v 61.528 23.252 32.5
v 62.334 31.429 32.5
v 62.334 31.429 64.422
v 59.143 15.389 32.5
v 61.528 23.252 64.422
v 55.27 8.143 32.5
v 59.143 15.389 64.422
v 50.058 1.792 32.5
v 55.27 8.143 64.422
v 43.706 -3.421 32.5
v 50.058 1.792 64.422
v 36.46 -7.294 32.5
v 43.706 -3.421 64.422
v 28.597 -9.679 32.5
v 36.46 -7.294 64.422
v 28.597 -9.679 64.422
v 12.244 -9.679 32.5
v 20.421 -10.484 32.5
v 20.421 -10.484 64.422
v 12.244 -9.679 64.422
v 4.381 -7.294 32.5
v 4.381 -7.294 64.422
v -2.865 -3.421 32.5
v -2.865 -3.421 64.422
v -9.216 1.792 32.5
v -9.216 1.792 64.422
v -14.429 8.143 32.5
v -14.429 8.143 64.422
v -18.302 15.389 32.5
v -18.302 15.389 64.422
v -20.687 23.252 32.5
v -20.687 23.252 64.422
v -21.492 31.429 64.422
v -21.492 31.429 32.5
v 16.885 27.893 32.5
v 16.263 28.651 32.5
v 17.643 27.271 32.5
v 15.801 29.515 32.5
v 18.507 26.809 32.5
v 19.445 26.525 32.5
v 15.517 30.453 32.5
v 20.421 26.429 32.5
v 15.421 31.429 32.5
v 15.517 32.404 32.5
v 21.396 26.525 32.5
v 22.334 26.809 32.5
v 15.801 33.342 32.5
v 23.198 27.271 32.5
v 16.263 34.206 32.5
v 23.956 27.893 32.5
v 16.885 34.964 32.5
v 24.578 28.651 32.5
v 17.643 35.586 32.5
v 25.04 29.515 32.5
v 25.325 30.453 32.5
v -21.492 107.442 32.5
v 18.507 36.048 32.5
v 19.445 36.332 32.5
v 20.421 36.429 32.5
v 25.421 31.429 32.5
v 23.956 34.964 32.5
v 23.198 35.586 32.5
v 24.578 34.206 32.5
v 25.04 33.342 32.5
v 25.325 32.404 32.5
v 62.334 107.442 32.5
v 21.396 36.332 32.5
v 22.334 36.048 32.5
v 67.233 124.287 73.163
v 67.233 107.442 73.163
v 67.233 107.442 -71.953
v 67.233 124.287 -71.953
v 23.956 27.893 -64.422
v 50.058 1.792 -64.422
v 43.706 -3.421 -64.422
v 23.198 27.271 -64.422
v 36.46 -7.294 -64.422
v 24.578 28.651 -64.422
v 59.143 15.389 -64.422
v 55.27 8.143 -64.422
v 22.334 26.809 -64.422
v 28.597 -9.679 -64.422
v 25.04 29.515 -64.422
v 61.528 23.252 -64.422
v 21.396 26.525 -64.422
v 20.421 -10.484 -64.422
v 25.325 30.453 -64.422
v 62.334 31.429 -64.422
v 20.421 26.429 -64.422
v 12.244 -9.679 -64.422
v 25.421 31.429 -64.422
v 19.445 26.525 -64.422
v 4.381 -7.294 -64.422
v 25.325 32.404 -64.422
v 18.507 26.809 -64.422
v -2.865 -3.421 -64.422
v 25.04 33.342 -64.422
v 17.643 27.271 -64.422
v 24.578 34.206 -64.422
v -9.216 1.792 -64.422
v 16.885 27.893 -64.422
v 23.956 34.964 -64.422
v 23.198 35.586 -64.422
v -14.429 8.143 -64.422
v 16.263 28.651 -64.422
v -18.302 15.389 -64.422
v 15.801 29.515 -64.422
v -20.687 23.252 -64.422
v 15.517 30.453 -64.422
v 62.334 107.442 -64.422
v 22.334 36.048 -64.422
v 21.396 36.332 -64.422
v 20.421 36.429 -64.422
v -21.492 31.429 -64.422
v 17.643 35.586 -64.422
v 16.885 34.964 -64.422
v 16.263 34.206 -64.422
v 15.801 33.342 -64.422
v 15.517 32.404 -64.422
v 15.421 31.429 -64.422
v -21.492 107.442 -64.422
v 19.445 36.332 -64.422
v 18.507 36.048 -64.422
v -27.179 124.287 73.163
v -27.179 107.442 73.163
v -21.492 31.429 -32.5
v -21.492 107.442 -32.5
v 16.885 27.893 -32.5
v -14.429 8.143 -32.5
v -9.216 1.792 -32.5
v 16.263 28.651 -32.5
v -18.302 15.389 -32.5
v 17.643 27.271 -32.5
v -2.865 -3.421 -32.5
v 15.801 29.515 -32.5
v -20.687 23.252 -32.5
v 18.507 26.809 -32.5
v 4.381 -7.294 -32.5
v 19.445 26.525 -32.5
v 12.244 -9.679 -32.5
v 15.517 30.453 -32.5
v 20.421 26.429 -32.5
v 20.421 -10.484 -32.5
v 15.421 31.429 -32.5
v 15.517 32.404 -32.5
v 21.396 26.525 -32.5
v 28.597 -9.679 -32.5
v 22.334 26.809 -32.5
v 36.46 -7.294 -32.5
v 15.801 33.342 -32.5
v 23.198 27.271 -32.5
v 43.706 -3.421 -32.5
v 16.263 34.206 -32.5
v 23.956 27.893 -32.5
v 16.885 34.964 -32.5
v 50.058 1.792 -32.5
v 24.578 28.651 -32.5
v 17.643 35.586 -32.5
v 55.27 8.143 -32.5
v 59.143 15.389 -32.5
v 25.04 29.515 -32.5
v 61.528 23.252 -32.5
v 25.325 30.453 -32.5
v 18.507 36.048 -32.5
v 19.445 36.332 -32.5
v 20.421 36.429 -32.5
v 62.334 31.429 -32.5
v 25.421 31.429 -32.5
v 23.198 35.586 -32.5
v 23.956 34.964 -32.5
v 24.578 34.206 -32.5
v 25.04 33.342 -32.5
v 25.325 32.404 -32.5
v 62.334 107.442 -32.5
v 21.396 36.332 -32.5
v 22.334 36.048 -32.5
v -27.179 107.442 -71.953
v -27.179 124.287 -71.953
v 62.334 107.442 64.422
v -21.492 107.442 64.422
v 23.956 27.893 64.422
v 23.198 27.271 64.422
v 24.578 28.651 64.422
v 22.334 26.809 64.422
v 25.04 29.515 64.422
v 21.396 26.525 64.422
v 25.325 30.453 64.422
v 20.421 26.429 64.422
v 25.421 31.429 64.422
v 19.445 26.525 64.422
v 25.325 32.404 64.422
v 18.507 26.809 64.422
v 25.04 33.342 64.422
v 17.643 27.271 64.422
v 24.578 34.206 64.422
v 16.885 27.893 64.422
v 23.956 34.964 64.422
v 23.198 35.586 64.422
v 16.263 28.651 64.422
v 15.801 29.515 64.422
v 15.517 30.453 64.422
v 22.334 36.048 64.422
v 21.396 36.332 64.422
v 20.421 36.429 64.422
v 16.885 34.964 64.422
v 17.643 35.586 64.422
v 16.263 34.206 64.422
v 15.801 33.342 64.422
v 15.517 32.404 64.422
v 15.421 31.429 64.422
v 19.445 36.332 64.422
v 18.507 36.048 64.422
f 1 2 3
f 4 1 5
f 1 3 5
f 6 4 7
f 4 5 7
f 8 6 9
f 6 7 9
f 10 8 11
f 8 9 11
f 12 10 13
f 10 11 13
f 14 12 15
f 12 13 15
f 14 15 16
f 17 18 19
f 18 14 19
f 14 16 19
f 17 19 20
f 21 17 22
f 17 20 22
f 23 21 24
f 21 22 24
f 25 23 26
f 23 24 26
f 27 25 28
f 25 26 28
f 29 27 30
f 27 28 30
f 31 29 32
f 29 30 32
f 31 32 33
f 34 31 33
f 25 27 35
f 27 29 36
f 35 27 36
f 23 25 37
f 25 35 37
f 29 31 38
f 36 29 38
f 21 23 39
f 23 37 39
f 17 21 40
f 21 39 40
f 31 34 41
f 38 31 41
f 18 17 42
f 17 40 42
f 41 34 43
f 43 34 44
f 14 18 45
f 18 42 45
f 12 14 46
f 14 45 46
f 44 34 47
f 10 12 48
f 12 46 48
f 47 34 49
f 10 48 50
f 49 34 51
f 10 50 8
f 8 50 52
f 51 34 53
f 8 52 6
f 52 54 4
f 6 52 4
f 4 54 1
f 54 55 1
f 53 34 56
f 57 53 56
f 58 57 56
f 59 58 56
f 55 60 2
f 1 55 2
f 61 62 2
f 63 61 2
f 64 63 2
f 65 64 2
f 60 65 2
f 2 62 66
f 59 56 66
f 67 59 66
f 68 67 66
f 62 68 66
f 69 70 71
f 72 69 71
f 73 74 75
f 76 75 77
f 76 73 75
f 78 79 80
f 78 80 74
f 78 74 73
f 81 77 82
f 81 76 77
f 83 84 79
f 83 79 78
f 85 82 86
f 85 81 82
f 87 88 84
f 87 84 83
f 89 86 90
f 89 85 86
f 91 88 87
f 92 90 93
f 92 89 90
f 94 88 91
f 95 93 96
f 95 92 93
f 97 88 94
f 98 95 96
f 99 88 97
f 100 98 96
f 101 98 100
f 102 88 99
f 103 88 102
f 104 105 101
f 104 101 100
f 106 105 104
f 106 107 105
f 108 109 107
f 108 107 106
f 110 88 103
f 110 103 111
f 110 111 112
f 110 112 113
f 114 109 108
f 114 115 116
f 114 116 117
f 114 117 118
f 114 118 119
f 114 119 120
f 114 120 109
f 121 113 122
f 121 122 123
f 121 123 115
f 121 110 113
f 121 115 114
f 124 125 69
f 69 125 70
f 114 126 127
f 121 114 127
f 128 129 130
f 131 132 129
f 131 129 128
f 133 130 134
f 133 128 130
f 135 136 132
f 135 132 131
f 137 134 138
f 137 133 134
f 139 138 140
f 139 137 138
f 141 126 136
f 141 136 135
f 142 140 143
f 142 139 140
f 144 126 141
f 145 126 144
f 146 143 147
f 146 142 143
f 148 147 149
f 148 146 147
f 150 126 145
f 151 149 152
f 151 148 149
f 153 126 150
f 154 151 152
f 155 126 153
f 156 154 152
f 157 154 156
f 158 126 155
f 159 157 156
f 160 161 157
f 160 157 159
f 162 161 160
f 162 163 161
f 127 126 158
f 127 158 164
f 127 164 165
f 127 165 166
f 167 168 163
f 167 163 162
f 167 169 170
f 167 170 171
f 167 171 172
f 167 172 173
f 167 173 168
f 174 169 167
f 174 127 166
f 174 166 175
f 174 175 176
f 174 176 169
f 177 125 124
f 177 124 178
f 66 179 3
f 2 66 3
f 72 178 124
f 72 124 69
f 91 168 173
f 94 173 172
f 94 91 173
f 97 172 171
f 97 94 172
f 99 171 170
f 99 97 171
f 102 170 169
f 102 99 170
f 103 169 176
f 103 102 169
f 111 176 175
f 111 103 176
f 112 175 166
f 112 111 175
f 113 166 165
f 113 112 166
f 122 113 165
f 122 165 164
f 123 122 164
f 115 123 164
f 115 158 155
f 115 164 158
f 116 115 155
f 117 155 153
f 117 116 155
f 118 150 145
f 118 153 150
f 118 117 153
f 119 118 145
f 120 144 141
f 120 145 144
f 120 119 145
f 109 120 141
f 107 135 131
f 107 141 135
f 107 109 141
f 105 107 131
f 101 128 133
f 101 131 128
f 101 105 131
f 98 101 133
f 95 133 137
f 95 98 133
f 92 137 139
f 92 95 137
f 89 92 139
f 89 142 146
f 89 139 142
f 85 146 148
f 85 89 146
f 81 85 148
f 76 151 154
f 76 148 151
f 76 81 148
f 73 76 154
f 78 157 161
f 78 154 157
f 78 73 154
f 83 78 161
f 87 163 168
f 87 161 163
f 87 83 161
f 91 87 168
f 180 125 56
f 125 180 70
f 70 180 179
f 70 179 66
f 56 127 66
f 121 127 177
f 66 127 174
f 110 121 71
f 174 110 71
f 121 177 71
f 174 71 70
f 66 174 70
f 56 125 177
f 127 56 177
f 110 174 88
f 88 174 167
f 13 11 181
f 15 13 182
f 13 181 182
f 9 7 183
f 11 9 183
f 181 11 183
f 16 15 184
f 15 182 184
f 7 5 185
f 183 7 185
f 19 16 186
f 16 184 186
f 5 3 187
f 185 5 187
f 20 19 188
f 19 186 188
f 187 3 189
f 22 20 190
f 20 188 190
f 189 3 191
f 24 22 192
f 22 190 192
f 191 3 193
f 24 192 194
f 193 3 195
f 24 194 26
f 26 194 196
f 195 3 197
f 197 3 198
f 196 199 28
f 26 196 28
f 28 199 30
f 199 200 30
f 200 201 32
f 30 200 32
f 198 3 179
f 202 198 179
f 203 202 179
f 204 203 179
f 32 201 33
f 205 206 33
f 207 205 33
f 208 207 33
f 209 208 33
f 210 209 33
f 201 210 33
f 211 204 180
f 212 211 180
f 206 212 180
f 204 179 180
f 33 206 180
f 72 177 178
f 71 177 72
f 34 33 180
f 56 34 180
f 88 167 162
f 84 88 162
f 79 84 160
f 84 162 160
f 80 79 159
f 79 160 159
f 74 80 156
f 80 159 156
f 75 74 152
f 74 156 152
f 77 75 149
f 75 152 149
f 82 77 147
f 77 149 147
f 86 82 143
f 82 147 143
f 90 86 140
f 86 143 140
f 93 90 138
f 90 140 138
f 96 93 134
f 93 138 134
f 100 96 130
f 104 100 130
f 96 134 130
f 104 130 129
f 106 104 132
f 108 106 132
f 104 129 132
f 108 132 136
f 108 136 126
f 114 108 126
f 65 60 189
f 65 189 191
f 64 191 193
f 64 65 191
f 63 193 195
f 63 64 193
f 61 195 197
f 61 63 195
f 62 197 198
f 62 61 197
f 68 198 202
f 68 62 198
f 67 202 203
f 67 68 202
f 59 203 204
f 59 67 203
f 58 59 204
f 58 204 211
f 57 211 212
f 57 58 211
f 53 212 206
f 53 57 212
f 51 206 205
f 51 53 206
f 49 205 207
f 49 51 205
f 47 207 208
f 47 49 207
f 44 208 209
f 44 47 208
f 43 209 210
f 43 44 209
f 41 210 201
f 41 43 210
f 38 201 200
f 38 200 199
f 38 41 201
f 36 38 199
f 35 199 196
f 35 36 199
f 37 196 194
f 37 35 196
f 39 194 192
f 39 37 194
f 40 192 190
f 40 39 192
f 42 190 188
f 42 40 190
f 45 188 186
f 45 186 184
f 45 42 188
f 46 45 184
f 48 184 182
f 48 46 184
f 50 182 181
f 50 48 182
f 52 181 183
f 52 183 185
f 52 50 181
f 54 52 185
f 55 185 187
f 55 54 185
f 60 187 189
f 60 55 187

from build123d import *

# Parameters (mm, degrees)
SKETCH4_R           = 5
BOSS_EXTRUDE4_DEPTH = 64.422352731
SKETCH6_W           = 94.412285725
SKETCH6_H           = 145.116249754
BOSS_EXTRUDE5_DEPTH = 16.844705461
SKETCH7_W           = 105.313643584
SKETCH7_H           = 127.479897163
CUT_EXTRUDE1_DEPTH  = 32.5


with BuildPart() as part:
    # Sketch4 → Boss-Extrude4 (new body, symmetric)
    with BuildSketch(Plane.XY):
        with BuildLine():
            Line((-21.492390891, 31.428545296), (-21.492390891, 107.442049888))
            Line((-21.492390891, 107.442049888), (62.333666954, 107.442049888))
            Line((62.333666954, 107.442049888), (62.333666954, 31.428545296))
            ThreePointArc((62.333666954, 31.428545296), (20.420638031, -10.484483627), (-21.492390891, 31.428545296))
        make_face()
        with Locations((20.420638031, 31.428545296)):
            Circle(SKETCH4_R, mode=Mode.SUBTRACT)
    extrude(amount=BOSS_EXTRUDE4_DEPTH, both=True)

    # Sketch6 → Boss-Extrude5 (add)
    with BuildSketch(Plane(origin=(0, 107.442049888, 0), x_dir=(1, 0, 0), z_dir=(0, 1, 0))):
        with Locations((20.027144796, -0.604818135)):
            Rectangle(SKETCH6_W, SKETCH6_H)
    extrude(amount=BOSS_EXTRUDE5_DEPTH)

    # Sketch7 → Cut-Extrude1 (cut, symmetric)
    with BuildSketch(Plane.XY):
        with Locations((20.29997807, 43.702101306)):
            Rectangle(SKETCH7_W, SKETCH7_H)
    extrude(amount=CUT_EXTRUDE1_DEPTH, both=True, mode=Mode.SUBTRACT)


solid = part.part
